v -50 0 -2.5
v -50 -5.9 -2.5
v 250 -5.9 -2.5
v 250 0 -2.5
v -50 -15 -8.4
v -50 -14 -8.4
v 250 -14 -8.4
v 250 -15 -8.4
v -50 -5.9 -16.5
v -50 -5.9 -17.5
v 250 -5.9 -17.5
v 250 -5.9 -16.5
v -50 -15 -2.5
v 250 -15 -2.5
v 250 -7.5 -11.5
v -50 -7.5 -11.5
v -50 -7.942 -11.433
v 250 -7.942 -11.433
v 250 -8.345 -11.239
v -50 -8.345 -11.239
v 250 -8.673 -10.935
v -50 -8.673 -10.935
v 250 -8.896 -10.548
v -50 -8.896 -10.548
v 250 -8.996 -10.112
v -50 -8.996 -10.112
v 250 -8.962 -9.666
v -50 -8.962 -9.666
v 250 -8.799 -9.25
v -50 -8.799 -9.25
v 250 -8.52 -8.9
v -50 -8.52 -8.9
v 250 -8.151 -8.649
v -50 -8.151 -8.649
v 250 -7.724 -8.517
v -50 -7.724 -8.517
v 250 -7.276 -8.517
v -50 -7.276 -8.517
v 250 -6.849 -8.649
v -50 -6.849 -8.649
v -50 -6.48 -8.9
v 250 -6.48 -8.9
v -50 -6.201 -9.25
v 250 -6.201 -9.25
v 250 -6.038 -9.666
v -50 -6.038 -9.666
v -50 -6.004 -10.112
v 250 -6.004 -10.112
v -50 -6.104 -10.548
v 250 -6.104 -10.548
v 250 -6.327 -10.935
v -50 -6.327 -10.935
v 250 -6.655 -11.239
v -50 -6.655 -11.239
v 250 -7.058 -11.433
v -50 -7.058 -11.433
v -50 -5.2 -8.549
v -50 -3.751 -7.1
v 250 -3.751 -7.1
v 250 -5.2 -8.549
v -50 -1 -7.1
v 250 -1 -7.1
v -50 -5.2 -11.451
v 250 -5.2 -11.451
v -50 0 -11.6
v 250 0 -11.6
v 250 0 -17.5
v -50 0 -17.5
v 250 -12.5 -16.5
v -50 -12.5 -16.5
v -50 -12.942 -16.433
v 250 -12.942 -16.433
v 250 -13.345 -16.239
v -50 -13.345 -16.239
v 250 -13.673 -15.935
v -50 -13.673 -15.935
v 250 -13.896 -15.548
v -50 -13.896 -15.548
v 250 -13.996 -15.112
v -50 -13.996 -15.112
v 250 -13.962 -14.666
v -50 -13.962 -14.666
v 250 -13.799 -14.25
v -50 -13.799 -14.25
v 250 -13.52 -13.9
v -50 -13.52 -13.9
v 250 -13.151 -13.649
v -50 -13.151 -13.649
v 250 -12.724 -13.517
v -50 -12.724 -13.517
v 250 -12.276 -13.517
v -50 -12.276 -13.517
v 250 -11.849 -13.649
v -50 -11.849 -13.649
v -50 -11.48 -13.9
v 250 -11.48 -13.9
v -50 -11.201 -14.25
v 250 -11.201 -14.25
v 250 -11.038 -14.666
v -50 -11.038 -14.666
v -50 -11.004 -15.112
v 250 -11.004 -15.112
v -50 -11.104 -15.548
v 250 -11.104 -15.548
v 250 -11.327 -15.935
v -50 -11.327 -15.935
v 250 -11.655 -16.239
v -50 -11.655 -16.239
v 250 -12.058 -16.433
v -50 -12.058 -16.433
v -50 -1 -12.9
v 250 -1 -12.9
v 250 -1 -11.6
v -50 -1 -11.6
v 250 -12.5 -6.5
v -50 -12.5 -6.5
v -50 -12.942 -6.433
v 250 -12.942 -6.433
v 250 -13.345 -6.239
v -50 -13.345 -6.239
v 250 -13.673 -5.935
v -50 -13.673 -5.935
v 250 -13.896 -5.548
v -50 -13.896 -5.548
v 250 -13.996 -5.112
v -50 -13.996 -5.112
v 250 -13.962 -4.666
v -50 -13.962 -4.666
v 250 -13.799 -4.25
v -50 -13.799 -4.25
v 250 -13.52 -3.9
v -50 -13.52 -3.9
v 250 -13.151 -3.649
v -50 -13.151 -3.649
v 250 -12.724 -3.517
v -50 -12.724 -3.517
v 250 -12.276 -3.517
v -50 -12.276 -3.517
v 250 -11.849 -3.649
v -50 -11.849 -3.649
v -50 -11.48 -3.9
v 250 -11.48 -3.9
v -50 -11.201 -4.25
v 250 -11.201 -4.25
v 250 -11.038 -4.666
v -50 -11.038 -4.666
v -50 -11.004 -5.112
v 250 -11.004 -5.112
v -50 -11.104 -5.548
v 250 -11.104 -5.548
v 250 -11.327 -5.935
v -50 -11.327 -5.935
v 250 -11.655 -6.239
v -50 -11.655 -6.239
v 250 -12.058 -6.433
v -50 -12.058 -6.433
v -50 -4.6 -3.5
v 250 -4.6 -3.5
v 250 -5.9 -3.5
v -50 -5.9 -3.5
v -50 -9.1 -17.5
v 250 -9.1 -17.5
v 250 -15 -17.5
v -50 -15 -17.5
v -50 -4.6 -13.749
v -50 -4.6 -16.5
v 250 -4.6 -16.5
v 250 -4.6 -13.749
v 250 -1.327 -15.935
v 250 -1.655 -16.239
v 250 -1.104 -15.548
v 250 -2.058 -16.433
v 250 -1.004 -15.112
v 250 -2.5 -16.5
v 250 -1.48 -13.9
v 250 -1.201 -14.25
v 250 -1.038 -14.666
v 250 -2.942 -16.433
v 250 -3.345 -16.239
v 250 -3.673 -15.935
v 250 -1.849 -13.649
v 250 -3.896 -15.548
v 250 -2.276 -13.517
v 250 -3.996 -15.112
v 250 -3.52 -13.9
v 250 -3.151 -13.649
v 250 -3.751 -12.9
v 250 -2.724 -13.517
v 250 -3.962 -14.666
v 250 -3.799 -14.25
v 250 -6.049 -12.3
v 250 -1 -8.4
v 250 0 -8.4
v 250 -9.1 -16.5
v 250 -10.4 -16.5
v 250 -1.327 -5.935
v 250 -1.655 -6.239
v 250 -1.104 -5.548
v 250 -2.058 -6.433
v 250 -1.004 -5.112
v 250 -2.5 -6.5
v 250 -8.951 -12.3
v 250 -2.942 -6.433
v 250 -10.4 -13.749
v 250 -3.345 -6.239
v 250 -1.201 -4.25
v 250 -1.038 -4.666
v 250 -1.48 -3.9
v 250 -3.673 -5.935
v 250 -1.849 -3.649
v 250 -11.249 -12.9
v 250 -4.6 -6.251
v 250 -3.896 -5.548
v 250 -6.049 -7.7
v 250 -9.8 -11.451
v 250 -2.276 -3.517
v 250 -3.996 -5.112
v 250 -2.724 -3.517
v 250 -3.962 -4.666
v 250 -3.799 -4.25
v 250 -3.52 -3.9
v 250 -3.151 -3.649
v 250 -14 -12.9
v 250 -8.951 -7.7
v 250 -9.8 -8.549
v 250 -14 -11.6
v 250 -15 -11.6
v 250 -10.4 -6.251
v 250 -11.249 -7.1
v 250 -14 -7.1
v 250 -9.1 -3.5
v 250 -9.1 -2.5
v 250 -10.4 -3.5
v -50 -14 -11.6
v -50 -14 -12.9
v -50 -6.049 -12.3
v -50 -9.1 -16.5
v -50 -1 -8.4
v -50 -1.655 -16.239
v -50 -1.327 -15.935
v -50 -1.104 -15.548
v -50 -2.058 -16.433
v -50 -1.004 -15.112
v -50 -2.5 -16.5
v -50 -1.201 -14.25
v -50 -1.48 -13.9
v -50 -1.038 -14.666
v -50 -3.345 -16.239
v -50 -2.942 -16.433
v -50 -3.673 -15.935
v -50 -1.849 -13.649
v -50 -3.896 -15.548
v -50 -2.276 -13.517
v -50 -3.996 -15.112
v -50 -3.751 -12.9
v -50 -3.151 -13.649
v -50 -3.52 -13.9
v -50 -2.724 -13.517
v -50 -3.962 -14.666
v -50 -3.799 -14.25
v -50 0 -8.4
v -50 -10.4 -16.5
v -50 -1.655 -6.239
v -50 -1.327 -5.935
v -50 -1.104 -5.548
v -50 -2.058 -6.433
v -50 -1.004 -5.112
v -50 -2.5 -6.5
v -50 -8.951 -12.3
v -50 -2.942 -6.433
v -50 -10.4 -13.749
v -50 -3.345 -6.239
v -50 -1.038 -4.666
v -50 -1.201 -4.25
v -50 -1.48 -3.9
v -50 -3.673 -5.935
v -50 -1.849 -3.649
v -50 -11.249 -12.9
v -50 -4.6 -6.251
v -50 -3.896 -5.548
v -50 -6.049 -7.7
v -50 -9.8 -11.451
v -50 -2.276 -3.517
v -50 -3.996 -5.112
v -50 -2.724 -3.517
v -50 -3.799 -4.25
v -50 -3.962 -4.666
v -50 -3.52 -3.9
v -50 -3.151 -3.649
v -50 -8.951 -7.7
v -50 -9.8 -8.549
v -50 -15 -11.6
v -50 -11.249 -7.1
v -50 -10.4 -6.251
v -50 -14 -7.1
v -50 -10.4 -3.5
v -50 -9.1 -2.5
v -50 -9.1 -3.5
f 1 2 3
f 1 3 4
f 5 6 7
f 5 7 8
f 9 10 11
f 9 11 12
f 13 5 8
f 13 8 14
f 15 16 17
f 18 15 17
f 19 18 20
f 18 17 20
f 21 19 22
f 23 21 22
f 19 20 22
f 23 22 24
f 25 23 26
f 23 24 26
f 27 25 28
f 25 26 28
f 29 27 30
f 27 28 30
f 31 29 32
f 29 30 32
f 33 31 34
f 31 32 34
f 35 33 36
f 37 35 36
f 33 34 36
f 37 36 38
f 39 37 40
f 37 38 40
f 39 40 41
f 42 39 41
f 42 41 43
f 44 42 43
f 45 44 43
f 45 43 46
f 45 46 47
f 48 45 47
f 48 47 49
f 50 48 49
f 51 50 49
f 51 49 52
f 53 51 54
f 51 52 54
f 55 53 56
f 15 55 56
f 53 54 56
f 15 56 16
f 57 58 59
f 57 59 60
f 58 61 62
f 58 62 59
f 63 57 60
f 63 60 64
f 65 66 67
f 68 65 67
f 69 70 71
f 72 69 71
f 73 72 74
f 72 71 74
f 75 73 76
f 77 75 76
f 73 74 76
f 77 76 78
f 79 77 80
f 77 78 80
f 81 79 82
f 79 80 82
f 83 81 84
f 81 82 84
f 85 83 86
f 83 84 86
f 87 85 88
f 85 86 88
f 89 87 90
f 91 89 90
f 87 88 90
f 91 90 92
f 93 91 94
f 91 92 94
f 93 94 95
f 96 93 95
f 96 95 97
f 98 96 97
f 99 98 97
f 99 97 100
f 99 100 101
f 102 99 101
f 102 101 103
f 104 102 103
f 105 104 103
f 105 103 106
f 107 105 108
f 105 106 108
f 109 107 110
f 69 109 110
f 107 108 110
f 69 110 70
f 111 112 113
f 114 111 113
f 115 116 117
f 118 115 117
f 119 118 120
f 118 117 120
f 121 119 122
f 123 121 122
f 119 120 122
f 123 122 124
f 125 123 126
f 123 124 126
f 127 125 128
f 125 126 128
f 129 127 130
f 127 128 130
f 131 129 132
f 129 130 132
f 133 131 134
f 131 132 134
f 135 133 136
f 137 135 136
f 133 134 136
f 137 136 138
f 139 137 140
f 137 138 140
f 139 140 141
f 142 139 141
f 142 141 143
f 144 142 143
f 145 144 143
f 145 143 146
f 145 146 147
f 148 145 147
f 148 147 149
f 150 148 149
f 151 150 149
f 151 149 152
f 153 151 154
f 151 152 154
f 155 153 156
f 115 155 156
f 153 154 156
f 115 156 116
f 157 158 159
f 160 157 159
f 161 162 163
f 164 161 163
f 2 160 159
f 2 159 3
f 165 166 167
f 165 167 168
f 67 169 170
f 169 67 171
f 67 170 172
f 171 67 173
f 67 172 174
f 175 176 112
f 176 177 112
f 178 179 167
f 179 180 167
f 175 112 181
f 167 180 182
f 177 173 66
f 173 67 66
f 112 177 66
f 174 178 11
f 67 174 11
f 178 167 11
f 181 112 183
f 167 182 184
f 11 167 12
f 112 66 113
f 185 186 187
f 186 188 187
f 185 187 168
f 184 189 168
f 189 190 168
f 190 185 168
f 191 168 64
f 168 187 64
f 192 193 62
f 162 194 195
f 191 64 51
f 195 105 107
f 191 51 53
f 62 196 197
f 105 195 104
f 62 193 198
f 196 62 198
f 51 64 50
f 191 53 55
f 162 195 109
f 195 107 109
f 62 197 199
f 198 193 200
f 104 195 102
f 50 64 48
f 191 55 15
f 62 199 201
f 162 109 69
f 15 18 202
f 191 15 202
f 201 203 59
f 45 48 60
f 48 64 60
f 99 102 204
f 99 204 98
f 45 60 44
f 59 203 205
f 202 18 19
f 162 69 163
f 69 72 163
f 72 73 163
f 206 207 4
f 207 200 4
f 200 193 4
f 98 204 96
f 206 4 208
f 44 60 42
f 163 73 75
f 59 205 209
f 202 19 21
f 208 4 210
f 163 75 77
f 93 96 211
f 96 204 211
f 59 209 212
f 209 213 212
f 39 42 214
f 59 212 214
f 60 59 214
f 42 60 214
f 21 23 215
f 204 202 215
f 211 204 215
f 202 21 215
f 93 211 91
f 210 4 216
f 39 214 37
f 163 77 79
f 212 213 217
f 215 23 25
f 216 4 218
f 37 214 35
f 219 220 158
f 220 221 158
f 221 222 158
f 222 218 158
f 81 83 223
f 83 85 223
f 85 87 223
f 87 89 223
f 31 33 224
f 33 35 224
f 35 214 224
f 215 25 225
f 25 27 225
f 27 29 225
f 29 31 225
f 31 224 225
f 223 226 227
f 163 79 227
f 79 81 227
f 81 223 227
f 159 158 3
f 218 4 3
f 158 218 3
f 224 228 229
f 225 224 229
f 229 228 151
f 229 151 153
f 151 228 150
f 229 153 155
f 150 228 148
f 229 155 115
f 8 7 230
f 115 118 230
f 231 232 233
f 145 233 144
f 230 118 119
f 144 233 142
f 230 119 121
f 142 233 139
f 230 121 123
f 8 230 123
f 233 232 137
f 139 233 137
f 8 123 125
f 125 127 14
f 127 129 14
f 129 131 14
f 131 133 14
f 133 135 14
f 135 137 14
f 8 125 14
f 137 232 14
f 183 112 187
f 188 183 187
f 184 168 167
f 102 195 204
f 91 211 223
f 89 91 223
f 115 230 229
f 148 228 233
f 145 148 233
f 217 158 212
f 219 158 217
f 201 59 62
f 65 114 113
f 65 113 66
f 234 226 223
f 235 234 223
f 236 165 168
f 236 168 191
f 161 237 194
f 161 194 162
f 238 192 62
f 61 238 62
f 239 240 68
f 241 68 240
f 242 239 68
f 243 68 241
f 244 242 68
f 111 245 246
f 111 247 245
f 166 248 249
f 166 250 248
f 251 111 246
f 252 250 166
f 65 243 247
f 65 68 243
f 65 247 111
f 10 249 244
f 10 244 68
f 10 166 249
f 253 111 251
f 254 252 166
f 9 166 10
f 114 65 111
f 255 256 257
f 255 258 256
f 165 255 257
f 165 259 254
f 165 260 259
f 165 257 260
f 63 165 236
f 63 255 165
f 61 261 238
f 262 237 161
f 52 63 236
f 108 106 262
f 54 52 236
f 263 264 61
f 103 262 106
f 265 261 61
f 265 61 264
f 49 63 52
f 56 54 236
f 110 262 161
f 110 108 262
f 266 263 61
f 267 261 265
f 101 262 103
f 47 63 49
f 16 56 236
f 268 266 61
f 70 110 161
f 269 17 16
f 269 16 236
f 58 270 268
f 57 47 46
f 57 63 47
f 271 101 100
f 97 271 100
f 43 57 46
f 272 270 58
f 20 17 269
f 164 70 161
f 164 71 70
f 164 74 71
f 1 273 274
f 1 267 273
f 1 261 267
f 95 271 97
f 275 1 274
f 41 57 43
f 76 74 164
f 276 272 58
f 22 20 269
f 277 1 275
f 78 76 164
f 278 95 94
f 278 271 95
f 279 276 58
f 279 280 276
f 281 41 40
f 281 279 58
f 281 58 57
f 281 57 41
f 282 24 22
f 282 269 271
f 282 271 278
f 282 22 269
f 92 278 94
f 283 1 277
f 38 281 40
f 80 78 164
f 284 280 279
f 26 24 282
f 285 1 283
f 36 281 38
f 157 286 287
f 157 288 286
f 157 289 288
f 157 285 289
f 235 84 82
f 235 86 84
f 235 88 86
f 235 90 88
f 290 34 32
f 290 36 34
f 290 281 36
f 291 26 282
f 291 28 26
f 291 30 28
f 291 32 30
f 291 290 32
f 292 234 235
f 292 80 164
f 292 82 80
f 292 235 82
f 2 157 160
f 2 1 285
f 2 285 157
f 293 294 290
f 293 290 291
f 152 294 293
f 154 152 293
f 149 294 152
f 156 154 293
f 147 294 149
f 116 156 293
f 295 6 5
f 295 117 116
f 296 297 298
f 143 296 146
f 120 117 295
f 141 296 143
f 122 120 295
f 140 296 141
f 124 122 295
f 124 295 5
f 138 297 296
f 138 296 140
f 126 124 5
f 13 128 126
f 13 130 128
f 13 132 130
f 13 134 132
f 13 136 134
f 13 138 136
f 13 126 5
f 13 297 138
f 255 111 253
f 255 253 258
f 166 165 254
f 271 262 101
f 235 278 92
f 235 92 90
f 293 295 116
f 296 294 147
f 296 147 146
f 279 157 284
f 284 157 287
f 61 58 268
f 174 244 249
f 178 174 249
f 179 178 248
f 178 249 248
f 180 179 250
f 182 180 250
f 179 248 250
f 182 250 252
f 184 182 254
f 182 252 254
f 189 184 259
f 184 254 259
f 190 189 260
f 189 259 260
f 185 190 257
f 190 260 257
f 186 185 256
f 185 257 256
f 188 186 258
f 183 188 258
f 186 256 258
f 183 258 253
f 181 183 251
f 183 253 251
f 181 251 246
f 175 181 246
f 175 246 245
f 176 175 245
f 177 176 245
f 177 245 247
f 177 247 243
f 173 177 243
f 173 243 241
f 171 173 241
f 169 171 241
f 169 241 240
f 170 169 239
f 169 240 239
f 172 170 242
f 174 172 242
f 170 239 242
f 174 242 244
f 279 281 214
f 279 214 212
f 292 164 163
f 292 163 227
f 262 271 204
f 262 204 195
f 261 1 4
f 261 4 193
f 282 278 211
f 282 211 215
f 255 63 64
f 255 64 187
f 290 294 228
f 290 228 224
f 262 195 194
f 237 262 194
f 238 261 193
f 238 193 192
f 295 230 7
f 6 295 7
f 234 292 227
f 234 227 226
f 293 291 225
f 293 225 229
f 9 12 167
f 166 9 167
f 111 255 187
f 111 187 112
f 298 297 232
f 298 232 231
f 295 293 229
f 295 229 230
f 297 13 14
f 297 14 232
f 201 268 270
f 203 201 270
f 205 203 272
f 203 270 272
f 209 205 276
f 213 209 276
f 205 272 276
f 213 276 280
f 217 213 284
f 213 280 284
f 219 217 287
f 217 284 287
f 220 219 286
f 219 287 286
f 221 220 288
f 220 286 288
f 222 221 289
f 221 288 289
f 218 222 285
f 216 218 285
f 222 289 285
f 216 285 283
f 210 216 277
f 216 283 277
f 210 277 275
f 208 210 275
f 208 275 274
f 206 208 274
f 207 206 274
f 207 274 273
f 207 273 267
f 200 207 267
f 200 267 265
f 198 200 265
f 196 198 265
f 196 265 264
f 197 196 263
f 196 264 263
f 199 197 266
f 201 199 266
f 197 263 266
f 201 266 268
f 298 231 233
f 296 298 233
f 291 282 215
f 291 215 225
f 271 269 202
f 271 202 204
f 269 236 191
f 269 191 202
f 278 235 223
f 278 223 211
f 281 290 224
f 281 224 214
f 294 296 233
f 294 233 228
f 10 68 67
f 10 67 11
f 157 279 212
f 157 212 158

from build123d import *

# Parameters (mm, degrees)
SKETCH1_R           = 1.5
BOSS_EXTRUDE1_DEPTH = 300


with BuildPart() as part:
    # Sketch1 → Boss-Extrude1 (new body)
    with BuildSketch(Plane(origin=(-50, 0, 0), x_dir=(0, -1, 0), z_dir=(-1, 0, 0))):
        Polygon((5.2, -11.451471863), (3.751471863, -12.9), (1, -12.9), (1, -11.6), (0, -11.6), (0, -17.5), (5.9, -17.5), (5.9, -16.5), (4.6, -16.5), (4.6, -13.748528137), (6.048528137, -12.3), (8.951471863, -12.3), (10.4, -13.748528137), (10.4, -16.5), (9.1, -16.5), (9.1, -17.5), (15, -17.5), (15, -11.6), (14, -11.6), (14, -12.9), (11.248528137, -12.9), (9.8, -11.451471863), (9.8, -8.548528137), (11.248528137, -7.1), (14, -7.1), (14, -8.4), (15, -8.4), (15, -2.5), (9.1, -2.5), (9.1, -3.5), (10.4, -3.5), (10.4, -6.251471863), (8.951471863, -7.7), (6.048528137, -7.7), (4.6, -6.251471863), (4.6, -3.5), (5.9, -3.5), (5.9, -2.5), (0, -2.5), (0, -8.4), (1, -8.4), (1, -7.1), (3.751471863, -7.1), (5.2, -8.548528137), align=None)
        with Locations(Location((7.5, -10, 0), (0, 0, 270))):
            Circle(SKETCH1_R, mode=Mode.SUBTRACT)
        with Locations(Location((2.5, -5, 0), (0, 0, 270))):
            Circle(SKETCH1_R, mode=Mode.SUBTRACT)
        with Locations(Location((2.5, -15, 0), (0, 0, 270))):
            Circle(SKETCH1_R, mode=Mode.SUBTRACT)
        with Locations(Location((12.5, -5, 0), (0, 0, 270))):
            Circle(SKETCH1_R, mode=Mode.SUBTRACT)
        with Locations(Location((12.5, -15, 0), (0, 0, 270))):
            Circle(SKETCH1_R, mode=Mode.SUBTRACT)
    extrude(amount=-BOSS_EXTRUDE1_DEPTH)


solid = part.part
